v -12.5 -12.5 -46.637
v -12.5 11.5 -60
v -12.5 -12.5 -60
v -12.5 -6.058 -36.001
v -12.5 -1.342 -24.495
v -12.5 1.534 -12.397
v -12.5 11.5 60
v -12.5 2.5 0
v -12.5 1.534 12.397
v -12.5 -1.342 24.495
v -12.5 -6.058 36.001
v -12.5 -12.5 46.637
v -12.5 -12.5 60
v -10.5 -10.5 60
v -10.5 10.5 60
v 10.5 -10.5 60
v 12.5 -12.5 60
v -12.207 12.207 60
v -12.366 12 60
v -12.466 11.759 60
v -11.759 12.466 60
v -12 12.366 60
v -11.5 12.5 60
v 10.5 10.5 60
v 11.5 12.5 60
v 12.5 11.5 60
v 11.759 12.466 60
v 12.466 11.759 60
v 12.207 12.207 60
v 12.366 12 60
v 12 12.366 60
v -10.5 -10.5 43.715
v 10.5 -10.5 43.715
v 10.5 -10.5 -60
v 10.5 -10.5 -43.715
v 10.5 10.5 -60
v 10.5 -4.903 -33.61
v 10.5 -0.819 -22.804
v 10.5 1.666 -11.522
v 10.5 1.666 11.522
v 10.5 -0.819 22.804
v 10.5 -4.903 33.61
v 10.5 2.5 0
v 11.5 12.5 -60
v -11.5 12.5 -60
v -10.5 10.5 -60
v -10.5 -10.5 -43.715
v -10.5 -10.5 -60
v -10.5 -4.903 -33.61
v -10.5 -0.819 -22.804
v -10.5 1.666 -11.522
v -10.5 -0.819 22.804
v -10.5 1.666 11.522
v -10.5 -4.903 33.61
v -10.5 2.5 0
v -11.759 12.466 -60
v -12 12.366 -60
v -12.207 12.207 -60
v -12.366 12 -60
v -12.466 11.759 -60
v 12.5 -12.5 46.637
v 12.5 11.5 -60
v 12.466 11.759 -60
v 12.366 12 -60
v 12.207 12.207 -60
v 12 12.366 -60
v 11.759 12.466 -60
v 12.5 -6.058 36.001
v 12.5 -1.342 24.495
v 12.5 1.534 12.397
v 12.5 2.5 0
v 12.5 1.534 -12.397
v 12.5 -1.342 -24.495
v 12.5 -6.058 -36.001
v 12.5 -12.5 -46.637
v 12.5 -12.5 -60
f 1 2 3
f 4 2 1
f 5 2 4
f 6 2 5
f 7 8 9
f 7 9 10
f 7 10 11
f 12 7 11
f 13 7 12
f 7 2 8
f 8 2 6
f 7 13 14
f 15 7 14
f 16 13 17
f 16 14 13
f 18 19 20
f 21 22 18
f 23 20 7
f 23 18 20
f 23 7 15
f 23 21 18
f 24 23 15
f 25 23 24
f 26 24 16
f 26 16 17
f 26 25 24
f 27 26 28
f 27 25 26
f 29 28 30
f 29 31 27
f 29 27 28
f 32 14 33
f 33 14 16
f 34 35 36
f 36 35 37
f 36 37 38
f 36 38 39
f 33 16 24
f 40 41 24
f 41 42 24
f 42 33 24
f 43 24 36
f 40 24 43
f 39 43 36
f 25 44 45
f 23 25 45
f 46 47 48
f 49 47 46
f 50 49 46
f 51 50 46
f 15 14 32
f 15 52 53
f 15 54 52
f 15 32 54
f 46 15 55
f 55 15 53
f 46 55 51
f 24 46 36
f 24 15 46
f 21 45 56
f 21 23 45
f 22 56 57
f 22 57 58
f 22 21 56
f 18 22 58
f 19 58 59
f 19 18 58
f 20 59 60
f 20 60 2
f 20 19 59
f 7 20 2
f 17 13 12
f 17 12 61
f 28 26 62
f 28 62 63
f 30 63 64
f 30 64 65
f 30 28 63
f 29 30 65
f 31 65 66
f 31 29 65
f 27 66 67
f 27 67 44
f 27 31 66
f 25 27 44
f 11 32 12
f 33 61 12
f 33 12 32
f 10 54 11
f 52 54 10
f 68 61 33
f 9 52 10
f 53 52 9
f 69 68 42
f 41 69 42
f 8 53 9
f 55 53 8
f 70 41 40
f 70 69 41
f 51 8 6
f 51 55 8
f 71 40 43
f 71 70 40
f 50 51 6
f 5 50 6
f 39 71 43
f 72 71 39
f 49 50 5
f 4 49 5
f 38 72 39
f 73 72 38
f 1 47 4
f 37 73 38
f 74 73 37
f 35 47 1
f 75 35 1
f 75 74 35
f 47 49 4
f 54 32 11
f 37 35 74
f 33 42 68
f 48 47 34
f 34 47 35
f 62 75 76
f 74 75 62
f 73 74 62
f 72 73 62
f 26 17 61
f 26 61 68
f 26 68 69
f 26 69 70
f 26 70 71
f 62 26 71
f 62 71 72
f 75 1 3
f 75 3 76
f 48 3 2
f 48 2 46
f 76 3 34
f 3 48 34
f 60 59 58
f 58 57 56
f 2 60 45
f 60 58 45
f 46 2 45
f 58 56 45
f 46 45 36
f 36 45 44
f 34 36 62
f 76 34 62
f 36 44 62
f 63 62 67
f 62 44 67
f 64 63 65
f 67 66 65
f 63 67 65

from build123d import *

# Parameters (mm, degrees)
EXTRUDE_1_DEPTH      = 60
EXTRUDE_1_DEPTH_BACK = 60
SKETCH_1_W           = 21
SKETCH_1_H           = 21
CUT_EXTRUDE_1_DEPTH  = 67.191011474


with BuildPart() as part:
    # Эскиз1 → Бобышка-Вытянуть1 (new, two sides: drawn at the far end of the back side and taken through both)
    with BuildSketch(Plane.XY.offset(-EXTRUDE_1_DEPTH_BACK)):
        with BuildLine():
            Line((-12.5, -12.5), (12.5, -12.5))
            Line((12.5, -12.5), (12.5, 11.5))
            ThreePointArc((12.5, 11.5), (12.207106781, 12.207106781), (11.5, 12.5))
            Line((11.5, 12.5), (-11.5, 12.5))
            ThreePointArc((-11.5, 12.5), (-12.207106781, 12.207106781), (-12.5, 11.5))
            Line((-12.5, 11.5), (-12.5, -12.5))
        make_face()
        Rectangle(SKETCH_1_W, SKETCH_1_H, mode=Mode.SUBTRACT)
    extrude(amount=EXTRUDE_1_DEPTH + EXTRUDE_1_DEPTH_BACK)

    # Эскиз2 → Вырез-Вытянуть1 (cut, through all)
    with BuildSketch(Plane(origin=(12.5, 0, 0), x_dir=(0, 0, -1), z_dir=(1, 0, 0))):
        with BuildLine():
            Line((-232.745226472, -146.030996161), (-46.636895265, -12.5))
            ThreePointArc((-46.636895265, -12.5), (0, 2.5), (46.636895265, -12.5))
            Line((46.636895265, -12.5), (232.745226472, -146.030996161))
            Line((232.745226472, -146.030996161), (232.745226472, -604.143811438))
            Line((232.745226472, -604.143811438), (-232.745226472, -604.143811438))
            Line((-232.745226472, -604.143811438), (-232.745226472, -146.030996161))
        make_face()
    extrude(amount=-CUT_EXTRUDE_1_DEPTH, mode=Mode.SUBTRACT)


solid = part.part
